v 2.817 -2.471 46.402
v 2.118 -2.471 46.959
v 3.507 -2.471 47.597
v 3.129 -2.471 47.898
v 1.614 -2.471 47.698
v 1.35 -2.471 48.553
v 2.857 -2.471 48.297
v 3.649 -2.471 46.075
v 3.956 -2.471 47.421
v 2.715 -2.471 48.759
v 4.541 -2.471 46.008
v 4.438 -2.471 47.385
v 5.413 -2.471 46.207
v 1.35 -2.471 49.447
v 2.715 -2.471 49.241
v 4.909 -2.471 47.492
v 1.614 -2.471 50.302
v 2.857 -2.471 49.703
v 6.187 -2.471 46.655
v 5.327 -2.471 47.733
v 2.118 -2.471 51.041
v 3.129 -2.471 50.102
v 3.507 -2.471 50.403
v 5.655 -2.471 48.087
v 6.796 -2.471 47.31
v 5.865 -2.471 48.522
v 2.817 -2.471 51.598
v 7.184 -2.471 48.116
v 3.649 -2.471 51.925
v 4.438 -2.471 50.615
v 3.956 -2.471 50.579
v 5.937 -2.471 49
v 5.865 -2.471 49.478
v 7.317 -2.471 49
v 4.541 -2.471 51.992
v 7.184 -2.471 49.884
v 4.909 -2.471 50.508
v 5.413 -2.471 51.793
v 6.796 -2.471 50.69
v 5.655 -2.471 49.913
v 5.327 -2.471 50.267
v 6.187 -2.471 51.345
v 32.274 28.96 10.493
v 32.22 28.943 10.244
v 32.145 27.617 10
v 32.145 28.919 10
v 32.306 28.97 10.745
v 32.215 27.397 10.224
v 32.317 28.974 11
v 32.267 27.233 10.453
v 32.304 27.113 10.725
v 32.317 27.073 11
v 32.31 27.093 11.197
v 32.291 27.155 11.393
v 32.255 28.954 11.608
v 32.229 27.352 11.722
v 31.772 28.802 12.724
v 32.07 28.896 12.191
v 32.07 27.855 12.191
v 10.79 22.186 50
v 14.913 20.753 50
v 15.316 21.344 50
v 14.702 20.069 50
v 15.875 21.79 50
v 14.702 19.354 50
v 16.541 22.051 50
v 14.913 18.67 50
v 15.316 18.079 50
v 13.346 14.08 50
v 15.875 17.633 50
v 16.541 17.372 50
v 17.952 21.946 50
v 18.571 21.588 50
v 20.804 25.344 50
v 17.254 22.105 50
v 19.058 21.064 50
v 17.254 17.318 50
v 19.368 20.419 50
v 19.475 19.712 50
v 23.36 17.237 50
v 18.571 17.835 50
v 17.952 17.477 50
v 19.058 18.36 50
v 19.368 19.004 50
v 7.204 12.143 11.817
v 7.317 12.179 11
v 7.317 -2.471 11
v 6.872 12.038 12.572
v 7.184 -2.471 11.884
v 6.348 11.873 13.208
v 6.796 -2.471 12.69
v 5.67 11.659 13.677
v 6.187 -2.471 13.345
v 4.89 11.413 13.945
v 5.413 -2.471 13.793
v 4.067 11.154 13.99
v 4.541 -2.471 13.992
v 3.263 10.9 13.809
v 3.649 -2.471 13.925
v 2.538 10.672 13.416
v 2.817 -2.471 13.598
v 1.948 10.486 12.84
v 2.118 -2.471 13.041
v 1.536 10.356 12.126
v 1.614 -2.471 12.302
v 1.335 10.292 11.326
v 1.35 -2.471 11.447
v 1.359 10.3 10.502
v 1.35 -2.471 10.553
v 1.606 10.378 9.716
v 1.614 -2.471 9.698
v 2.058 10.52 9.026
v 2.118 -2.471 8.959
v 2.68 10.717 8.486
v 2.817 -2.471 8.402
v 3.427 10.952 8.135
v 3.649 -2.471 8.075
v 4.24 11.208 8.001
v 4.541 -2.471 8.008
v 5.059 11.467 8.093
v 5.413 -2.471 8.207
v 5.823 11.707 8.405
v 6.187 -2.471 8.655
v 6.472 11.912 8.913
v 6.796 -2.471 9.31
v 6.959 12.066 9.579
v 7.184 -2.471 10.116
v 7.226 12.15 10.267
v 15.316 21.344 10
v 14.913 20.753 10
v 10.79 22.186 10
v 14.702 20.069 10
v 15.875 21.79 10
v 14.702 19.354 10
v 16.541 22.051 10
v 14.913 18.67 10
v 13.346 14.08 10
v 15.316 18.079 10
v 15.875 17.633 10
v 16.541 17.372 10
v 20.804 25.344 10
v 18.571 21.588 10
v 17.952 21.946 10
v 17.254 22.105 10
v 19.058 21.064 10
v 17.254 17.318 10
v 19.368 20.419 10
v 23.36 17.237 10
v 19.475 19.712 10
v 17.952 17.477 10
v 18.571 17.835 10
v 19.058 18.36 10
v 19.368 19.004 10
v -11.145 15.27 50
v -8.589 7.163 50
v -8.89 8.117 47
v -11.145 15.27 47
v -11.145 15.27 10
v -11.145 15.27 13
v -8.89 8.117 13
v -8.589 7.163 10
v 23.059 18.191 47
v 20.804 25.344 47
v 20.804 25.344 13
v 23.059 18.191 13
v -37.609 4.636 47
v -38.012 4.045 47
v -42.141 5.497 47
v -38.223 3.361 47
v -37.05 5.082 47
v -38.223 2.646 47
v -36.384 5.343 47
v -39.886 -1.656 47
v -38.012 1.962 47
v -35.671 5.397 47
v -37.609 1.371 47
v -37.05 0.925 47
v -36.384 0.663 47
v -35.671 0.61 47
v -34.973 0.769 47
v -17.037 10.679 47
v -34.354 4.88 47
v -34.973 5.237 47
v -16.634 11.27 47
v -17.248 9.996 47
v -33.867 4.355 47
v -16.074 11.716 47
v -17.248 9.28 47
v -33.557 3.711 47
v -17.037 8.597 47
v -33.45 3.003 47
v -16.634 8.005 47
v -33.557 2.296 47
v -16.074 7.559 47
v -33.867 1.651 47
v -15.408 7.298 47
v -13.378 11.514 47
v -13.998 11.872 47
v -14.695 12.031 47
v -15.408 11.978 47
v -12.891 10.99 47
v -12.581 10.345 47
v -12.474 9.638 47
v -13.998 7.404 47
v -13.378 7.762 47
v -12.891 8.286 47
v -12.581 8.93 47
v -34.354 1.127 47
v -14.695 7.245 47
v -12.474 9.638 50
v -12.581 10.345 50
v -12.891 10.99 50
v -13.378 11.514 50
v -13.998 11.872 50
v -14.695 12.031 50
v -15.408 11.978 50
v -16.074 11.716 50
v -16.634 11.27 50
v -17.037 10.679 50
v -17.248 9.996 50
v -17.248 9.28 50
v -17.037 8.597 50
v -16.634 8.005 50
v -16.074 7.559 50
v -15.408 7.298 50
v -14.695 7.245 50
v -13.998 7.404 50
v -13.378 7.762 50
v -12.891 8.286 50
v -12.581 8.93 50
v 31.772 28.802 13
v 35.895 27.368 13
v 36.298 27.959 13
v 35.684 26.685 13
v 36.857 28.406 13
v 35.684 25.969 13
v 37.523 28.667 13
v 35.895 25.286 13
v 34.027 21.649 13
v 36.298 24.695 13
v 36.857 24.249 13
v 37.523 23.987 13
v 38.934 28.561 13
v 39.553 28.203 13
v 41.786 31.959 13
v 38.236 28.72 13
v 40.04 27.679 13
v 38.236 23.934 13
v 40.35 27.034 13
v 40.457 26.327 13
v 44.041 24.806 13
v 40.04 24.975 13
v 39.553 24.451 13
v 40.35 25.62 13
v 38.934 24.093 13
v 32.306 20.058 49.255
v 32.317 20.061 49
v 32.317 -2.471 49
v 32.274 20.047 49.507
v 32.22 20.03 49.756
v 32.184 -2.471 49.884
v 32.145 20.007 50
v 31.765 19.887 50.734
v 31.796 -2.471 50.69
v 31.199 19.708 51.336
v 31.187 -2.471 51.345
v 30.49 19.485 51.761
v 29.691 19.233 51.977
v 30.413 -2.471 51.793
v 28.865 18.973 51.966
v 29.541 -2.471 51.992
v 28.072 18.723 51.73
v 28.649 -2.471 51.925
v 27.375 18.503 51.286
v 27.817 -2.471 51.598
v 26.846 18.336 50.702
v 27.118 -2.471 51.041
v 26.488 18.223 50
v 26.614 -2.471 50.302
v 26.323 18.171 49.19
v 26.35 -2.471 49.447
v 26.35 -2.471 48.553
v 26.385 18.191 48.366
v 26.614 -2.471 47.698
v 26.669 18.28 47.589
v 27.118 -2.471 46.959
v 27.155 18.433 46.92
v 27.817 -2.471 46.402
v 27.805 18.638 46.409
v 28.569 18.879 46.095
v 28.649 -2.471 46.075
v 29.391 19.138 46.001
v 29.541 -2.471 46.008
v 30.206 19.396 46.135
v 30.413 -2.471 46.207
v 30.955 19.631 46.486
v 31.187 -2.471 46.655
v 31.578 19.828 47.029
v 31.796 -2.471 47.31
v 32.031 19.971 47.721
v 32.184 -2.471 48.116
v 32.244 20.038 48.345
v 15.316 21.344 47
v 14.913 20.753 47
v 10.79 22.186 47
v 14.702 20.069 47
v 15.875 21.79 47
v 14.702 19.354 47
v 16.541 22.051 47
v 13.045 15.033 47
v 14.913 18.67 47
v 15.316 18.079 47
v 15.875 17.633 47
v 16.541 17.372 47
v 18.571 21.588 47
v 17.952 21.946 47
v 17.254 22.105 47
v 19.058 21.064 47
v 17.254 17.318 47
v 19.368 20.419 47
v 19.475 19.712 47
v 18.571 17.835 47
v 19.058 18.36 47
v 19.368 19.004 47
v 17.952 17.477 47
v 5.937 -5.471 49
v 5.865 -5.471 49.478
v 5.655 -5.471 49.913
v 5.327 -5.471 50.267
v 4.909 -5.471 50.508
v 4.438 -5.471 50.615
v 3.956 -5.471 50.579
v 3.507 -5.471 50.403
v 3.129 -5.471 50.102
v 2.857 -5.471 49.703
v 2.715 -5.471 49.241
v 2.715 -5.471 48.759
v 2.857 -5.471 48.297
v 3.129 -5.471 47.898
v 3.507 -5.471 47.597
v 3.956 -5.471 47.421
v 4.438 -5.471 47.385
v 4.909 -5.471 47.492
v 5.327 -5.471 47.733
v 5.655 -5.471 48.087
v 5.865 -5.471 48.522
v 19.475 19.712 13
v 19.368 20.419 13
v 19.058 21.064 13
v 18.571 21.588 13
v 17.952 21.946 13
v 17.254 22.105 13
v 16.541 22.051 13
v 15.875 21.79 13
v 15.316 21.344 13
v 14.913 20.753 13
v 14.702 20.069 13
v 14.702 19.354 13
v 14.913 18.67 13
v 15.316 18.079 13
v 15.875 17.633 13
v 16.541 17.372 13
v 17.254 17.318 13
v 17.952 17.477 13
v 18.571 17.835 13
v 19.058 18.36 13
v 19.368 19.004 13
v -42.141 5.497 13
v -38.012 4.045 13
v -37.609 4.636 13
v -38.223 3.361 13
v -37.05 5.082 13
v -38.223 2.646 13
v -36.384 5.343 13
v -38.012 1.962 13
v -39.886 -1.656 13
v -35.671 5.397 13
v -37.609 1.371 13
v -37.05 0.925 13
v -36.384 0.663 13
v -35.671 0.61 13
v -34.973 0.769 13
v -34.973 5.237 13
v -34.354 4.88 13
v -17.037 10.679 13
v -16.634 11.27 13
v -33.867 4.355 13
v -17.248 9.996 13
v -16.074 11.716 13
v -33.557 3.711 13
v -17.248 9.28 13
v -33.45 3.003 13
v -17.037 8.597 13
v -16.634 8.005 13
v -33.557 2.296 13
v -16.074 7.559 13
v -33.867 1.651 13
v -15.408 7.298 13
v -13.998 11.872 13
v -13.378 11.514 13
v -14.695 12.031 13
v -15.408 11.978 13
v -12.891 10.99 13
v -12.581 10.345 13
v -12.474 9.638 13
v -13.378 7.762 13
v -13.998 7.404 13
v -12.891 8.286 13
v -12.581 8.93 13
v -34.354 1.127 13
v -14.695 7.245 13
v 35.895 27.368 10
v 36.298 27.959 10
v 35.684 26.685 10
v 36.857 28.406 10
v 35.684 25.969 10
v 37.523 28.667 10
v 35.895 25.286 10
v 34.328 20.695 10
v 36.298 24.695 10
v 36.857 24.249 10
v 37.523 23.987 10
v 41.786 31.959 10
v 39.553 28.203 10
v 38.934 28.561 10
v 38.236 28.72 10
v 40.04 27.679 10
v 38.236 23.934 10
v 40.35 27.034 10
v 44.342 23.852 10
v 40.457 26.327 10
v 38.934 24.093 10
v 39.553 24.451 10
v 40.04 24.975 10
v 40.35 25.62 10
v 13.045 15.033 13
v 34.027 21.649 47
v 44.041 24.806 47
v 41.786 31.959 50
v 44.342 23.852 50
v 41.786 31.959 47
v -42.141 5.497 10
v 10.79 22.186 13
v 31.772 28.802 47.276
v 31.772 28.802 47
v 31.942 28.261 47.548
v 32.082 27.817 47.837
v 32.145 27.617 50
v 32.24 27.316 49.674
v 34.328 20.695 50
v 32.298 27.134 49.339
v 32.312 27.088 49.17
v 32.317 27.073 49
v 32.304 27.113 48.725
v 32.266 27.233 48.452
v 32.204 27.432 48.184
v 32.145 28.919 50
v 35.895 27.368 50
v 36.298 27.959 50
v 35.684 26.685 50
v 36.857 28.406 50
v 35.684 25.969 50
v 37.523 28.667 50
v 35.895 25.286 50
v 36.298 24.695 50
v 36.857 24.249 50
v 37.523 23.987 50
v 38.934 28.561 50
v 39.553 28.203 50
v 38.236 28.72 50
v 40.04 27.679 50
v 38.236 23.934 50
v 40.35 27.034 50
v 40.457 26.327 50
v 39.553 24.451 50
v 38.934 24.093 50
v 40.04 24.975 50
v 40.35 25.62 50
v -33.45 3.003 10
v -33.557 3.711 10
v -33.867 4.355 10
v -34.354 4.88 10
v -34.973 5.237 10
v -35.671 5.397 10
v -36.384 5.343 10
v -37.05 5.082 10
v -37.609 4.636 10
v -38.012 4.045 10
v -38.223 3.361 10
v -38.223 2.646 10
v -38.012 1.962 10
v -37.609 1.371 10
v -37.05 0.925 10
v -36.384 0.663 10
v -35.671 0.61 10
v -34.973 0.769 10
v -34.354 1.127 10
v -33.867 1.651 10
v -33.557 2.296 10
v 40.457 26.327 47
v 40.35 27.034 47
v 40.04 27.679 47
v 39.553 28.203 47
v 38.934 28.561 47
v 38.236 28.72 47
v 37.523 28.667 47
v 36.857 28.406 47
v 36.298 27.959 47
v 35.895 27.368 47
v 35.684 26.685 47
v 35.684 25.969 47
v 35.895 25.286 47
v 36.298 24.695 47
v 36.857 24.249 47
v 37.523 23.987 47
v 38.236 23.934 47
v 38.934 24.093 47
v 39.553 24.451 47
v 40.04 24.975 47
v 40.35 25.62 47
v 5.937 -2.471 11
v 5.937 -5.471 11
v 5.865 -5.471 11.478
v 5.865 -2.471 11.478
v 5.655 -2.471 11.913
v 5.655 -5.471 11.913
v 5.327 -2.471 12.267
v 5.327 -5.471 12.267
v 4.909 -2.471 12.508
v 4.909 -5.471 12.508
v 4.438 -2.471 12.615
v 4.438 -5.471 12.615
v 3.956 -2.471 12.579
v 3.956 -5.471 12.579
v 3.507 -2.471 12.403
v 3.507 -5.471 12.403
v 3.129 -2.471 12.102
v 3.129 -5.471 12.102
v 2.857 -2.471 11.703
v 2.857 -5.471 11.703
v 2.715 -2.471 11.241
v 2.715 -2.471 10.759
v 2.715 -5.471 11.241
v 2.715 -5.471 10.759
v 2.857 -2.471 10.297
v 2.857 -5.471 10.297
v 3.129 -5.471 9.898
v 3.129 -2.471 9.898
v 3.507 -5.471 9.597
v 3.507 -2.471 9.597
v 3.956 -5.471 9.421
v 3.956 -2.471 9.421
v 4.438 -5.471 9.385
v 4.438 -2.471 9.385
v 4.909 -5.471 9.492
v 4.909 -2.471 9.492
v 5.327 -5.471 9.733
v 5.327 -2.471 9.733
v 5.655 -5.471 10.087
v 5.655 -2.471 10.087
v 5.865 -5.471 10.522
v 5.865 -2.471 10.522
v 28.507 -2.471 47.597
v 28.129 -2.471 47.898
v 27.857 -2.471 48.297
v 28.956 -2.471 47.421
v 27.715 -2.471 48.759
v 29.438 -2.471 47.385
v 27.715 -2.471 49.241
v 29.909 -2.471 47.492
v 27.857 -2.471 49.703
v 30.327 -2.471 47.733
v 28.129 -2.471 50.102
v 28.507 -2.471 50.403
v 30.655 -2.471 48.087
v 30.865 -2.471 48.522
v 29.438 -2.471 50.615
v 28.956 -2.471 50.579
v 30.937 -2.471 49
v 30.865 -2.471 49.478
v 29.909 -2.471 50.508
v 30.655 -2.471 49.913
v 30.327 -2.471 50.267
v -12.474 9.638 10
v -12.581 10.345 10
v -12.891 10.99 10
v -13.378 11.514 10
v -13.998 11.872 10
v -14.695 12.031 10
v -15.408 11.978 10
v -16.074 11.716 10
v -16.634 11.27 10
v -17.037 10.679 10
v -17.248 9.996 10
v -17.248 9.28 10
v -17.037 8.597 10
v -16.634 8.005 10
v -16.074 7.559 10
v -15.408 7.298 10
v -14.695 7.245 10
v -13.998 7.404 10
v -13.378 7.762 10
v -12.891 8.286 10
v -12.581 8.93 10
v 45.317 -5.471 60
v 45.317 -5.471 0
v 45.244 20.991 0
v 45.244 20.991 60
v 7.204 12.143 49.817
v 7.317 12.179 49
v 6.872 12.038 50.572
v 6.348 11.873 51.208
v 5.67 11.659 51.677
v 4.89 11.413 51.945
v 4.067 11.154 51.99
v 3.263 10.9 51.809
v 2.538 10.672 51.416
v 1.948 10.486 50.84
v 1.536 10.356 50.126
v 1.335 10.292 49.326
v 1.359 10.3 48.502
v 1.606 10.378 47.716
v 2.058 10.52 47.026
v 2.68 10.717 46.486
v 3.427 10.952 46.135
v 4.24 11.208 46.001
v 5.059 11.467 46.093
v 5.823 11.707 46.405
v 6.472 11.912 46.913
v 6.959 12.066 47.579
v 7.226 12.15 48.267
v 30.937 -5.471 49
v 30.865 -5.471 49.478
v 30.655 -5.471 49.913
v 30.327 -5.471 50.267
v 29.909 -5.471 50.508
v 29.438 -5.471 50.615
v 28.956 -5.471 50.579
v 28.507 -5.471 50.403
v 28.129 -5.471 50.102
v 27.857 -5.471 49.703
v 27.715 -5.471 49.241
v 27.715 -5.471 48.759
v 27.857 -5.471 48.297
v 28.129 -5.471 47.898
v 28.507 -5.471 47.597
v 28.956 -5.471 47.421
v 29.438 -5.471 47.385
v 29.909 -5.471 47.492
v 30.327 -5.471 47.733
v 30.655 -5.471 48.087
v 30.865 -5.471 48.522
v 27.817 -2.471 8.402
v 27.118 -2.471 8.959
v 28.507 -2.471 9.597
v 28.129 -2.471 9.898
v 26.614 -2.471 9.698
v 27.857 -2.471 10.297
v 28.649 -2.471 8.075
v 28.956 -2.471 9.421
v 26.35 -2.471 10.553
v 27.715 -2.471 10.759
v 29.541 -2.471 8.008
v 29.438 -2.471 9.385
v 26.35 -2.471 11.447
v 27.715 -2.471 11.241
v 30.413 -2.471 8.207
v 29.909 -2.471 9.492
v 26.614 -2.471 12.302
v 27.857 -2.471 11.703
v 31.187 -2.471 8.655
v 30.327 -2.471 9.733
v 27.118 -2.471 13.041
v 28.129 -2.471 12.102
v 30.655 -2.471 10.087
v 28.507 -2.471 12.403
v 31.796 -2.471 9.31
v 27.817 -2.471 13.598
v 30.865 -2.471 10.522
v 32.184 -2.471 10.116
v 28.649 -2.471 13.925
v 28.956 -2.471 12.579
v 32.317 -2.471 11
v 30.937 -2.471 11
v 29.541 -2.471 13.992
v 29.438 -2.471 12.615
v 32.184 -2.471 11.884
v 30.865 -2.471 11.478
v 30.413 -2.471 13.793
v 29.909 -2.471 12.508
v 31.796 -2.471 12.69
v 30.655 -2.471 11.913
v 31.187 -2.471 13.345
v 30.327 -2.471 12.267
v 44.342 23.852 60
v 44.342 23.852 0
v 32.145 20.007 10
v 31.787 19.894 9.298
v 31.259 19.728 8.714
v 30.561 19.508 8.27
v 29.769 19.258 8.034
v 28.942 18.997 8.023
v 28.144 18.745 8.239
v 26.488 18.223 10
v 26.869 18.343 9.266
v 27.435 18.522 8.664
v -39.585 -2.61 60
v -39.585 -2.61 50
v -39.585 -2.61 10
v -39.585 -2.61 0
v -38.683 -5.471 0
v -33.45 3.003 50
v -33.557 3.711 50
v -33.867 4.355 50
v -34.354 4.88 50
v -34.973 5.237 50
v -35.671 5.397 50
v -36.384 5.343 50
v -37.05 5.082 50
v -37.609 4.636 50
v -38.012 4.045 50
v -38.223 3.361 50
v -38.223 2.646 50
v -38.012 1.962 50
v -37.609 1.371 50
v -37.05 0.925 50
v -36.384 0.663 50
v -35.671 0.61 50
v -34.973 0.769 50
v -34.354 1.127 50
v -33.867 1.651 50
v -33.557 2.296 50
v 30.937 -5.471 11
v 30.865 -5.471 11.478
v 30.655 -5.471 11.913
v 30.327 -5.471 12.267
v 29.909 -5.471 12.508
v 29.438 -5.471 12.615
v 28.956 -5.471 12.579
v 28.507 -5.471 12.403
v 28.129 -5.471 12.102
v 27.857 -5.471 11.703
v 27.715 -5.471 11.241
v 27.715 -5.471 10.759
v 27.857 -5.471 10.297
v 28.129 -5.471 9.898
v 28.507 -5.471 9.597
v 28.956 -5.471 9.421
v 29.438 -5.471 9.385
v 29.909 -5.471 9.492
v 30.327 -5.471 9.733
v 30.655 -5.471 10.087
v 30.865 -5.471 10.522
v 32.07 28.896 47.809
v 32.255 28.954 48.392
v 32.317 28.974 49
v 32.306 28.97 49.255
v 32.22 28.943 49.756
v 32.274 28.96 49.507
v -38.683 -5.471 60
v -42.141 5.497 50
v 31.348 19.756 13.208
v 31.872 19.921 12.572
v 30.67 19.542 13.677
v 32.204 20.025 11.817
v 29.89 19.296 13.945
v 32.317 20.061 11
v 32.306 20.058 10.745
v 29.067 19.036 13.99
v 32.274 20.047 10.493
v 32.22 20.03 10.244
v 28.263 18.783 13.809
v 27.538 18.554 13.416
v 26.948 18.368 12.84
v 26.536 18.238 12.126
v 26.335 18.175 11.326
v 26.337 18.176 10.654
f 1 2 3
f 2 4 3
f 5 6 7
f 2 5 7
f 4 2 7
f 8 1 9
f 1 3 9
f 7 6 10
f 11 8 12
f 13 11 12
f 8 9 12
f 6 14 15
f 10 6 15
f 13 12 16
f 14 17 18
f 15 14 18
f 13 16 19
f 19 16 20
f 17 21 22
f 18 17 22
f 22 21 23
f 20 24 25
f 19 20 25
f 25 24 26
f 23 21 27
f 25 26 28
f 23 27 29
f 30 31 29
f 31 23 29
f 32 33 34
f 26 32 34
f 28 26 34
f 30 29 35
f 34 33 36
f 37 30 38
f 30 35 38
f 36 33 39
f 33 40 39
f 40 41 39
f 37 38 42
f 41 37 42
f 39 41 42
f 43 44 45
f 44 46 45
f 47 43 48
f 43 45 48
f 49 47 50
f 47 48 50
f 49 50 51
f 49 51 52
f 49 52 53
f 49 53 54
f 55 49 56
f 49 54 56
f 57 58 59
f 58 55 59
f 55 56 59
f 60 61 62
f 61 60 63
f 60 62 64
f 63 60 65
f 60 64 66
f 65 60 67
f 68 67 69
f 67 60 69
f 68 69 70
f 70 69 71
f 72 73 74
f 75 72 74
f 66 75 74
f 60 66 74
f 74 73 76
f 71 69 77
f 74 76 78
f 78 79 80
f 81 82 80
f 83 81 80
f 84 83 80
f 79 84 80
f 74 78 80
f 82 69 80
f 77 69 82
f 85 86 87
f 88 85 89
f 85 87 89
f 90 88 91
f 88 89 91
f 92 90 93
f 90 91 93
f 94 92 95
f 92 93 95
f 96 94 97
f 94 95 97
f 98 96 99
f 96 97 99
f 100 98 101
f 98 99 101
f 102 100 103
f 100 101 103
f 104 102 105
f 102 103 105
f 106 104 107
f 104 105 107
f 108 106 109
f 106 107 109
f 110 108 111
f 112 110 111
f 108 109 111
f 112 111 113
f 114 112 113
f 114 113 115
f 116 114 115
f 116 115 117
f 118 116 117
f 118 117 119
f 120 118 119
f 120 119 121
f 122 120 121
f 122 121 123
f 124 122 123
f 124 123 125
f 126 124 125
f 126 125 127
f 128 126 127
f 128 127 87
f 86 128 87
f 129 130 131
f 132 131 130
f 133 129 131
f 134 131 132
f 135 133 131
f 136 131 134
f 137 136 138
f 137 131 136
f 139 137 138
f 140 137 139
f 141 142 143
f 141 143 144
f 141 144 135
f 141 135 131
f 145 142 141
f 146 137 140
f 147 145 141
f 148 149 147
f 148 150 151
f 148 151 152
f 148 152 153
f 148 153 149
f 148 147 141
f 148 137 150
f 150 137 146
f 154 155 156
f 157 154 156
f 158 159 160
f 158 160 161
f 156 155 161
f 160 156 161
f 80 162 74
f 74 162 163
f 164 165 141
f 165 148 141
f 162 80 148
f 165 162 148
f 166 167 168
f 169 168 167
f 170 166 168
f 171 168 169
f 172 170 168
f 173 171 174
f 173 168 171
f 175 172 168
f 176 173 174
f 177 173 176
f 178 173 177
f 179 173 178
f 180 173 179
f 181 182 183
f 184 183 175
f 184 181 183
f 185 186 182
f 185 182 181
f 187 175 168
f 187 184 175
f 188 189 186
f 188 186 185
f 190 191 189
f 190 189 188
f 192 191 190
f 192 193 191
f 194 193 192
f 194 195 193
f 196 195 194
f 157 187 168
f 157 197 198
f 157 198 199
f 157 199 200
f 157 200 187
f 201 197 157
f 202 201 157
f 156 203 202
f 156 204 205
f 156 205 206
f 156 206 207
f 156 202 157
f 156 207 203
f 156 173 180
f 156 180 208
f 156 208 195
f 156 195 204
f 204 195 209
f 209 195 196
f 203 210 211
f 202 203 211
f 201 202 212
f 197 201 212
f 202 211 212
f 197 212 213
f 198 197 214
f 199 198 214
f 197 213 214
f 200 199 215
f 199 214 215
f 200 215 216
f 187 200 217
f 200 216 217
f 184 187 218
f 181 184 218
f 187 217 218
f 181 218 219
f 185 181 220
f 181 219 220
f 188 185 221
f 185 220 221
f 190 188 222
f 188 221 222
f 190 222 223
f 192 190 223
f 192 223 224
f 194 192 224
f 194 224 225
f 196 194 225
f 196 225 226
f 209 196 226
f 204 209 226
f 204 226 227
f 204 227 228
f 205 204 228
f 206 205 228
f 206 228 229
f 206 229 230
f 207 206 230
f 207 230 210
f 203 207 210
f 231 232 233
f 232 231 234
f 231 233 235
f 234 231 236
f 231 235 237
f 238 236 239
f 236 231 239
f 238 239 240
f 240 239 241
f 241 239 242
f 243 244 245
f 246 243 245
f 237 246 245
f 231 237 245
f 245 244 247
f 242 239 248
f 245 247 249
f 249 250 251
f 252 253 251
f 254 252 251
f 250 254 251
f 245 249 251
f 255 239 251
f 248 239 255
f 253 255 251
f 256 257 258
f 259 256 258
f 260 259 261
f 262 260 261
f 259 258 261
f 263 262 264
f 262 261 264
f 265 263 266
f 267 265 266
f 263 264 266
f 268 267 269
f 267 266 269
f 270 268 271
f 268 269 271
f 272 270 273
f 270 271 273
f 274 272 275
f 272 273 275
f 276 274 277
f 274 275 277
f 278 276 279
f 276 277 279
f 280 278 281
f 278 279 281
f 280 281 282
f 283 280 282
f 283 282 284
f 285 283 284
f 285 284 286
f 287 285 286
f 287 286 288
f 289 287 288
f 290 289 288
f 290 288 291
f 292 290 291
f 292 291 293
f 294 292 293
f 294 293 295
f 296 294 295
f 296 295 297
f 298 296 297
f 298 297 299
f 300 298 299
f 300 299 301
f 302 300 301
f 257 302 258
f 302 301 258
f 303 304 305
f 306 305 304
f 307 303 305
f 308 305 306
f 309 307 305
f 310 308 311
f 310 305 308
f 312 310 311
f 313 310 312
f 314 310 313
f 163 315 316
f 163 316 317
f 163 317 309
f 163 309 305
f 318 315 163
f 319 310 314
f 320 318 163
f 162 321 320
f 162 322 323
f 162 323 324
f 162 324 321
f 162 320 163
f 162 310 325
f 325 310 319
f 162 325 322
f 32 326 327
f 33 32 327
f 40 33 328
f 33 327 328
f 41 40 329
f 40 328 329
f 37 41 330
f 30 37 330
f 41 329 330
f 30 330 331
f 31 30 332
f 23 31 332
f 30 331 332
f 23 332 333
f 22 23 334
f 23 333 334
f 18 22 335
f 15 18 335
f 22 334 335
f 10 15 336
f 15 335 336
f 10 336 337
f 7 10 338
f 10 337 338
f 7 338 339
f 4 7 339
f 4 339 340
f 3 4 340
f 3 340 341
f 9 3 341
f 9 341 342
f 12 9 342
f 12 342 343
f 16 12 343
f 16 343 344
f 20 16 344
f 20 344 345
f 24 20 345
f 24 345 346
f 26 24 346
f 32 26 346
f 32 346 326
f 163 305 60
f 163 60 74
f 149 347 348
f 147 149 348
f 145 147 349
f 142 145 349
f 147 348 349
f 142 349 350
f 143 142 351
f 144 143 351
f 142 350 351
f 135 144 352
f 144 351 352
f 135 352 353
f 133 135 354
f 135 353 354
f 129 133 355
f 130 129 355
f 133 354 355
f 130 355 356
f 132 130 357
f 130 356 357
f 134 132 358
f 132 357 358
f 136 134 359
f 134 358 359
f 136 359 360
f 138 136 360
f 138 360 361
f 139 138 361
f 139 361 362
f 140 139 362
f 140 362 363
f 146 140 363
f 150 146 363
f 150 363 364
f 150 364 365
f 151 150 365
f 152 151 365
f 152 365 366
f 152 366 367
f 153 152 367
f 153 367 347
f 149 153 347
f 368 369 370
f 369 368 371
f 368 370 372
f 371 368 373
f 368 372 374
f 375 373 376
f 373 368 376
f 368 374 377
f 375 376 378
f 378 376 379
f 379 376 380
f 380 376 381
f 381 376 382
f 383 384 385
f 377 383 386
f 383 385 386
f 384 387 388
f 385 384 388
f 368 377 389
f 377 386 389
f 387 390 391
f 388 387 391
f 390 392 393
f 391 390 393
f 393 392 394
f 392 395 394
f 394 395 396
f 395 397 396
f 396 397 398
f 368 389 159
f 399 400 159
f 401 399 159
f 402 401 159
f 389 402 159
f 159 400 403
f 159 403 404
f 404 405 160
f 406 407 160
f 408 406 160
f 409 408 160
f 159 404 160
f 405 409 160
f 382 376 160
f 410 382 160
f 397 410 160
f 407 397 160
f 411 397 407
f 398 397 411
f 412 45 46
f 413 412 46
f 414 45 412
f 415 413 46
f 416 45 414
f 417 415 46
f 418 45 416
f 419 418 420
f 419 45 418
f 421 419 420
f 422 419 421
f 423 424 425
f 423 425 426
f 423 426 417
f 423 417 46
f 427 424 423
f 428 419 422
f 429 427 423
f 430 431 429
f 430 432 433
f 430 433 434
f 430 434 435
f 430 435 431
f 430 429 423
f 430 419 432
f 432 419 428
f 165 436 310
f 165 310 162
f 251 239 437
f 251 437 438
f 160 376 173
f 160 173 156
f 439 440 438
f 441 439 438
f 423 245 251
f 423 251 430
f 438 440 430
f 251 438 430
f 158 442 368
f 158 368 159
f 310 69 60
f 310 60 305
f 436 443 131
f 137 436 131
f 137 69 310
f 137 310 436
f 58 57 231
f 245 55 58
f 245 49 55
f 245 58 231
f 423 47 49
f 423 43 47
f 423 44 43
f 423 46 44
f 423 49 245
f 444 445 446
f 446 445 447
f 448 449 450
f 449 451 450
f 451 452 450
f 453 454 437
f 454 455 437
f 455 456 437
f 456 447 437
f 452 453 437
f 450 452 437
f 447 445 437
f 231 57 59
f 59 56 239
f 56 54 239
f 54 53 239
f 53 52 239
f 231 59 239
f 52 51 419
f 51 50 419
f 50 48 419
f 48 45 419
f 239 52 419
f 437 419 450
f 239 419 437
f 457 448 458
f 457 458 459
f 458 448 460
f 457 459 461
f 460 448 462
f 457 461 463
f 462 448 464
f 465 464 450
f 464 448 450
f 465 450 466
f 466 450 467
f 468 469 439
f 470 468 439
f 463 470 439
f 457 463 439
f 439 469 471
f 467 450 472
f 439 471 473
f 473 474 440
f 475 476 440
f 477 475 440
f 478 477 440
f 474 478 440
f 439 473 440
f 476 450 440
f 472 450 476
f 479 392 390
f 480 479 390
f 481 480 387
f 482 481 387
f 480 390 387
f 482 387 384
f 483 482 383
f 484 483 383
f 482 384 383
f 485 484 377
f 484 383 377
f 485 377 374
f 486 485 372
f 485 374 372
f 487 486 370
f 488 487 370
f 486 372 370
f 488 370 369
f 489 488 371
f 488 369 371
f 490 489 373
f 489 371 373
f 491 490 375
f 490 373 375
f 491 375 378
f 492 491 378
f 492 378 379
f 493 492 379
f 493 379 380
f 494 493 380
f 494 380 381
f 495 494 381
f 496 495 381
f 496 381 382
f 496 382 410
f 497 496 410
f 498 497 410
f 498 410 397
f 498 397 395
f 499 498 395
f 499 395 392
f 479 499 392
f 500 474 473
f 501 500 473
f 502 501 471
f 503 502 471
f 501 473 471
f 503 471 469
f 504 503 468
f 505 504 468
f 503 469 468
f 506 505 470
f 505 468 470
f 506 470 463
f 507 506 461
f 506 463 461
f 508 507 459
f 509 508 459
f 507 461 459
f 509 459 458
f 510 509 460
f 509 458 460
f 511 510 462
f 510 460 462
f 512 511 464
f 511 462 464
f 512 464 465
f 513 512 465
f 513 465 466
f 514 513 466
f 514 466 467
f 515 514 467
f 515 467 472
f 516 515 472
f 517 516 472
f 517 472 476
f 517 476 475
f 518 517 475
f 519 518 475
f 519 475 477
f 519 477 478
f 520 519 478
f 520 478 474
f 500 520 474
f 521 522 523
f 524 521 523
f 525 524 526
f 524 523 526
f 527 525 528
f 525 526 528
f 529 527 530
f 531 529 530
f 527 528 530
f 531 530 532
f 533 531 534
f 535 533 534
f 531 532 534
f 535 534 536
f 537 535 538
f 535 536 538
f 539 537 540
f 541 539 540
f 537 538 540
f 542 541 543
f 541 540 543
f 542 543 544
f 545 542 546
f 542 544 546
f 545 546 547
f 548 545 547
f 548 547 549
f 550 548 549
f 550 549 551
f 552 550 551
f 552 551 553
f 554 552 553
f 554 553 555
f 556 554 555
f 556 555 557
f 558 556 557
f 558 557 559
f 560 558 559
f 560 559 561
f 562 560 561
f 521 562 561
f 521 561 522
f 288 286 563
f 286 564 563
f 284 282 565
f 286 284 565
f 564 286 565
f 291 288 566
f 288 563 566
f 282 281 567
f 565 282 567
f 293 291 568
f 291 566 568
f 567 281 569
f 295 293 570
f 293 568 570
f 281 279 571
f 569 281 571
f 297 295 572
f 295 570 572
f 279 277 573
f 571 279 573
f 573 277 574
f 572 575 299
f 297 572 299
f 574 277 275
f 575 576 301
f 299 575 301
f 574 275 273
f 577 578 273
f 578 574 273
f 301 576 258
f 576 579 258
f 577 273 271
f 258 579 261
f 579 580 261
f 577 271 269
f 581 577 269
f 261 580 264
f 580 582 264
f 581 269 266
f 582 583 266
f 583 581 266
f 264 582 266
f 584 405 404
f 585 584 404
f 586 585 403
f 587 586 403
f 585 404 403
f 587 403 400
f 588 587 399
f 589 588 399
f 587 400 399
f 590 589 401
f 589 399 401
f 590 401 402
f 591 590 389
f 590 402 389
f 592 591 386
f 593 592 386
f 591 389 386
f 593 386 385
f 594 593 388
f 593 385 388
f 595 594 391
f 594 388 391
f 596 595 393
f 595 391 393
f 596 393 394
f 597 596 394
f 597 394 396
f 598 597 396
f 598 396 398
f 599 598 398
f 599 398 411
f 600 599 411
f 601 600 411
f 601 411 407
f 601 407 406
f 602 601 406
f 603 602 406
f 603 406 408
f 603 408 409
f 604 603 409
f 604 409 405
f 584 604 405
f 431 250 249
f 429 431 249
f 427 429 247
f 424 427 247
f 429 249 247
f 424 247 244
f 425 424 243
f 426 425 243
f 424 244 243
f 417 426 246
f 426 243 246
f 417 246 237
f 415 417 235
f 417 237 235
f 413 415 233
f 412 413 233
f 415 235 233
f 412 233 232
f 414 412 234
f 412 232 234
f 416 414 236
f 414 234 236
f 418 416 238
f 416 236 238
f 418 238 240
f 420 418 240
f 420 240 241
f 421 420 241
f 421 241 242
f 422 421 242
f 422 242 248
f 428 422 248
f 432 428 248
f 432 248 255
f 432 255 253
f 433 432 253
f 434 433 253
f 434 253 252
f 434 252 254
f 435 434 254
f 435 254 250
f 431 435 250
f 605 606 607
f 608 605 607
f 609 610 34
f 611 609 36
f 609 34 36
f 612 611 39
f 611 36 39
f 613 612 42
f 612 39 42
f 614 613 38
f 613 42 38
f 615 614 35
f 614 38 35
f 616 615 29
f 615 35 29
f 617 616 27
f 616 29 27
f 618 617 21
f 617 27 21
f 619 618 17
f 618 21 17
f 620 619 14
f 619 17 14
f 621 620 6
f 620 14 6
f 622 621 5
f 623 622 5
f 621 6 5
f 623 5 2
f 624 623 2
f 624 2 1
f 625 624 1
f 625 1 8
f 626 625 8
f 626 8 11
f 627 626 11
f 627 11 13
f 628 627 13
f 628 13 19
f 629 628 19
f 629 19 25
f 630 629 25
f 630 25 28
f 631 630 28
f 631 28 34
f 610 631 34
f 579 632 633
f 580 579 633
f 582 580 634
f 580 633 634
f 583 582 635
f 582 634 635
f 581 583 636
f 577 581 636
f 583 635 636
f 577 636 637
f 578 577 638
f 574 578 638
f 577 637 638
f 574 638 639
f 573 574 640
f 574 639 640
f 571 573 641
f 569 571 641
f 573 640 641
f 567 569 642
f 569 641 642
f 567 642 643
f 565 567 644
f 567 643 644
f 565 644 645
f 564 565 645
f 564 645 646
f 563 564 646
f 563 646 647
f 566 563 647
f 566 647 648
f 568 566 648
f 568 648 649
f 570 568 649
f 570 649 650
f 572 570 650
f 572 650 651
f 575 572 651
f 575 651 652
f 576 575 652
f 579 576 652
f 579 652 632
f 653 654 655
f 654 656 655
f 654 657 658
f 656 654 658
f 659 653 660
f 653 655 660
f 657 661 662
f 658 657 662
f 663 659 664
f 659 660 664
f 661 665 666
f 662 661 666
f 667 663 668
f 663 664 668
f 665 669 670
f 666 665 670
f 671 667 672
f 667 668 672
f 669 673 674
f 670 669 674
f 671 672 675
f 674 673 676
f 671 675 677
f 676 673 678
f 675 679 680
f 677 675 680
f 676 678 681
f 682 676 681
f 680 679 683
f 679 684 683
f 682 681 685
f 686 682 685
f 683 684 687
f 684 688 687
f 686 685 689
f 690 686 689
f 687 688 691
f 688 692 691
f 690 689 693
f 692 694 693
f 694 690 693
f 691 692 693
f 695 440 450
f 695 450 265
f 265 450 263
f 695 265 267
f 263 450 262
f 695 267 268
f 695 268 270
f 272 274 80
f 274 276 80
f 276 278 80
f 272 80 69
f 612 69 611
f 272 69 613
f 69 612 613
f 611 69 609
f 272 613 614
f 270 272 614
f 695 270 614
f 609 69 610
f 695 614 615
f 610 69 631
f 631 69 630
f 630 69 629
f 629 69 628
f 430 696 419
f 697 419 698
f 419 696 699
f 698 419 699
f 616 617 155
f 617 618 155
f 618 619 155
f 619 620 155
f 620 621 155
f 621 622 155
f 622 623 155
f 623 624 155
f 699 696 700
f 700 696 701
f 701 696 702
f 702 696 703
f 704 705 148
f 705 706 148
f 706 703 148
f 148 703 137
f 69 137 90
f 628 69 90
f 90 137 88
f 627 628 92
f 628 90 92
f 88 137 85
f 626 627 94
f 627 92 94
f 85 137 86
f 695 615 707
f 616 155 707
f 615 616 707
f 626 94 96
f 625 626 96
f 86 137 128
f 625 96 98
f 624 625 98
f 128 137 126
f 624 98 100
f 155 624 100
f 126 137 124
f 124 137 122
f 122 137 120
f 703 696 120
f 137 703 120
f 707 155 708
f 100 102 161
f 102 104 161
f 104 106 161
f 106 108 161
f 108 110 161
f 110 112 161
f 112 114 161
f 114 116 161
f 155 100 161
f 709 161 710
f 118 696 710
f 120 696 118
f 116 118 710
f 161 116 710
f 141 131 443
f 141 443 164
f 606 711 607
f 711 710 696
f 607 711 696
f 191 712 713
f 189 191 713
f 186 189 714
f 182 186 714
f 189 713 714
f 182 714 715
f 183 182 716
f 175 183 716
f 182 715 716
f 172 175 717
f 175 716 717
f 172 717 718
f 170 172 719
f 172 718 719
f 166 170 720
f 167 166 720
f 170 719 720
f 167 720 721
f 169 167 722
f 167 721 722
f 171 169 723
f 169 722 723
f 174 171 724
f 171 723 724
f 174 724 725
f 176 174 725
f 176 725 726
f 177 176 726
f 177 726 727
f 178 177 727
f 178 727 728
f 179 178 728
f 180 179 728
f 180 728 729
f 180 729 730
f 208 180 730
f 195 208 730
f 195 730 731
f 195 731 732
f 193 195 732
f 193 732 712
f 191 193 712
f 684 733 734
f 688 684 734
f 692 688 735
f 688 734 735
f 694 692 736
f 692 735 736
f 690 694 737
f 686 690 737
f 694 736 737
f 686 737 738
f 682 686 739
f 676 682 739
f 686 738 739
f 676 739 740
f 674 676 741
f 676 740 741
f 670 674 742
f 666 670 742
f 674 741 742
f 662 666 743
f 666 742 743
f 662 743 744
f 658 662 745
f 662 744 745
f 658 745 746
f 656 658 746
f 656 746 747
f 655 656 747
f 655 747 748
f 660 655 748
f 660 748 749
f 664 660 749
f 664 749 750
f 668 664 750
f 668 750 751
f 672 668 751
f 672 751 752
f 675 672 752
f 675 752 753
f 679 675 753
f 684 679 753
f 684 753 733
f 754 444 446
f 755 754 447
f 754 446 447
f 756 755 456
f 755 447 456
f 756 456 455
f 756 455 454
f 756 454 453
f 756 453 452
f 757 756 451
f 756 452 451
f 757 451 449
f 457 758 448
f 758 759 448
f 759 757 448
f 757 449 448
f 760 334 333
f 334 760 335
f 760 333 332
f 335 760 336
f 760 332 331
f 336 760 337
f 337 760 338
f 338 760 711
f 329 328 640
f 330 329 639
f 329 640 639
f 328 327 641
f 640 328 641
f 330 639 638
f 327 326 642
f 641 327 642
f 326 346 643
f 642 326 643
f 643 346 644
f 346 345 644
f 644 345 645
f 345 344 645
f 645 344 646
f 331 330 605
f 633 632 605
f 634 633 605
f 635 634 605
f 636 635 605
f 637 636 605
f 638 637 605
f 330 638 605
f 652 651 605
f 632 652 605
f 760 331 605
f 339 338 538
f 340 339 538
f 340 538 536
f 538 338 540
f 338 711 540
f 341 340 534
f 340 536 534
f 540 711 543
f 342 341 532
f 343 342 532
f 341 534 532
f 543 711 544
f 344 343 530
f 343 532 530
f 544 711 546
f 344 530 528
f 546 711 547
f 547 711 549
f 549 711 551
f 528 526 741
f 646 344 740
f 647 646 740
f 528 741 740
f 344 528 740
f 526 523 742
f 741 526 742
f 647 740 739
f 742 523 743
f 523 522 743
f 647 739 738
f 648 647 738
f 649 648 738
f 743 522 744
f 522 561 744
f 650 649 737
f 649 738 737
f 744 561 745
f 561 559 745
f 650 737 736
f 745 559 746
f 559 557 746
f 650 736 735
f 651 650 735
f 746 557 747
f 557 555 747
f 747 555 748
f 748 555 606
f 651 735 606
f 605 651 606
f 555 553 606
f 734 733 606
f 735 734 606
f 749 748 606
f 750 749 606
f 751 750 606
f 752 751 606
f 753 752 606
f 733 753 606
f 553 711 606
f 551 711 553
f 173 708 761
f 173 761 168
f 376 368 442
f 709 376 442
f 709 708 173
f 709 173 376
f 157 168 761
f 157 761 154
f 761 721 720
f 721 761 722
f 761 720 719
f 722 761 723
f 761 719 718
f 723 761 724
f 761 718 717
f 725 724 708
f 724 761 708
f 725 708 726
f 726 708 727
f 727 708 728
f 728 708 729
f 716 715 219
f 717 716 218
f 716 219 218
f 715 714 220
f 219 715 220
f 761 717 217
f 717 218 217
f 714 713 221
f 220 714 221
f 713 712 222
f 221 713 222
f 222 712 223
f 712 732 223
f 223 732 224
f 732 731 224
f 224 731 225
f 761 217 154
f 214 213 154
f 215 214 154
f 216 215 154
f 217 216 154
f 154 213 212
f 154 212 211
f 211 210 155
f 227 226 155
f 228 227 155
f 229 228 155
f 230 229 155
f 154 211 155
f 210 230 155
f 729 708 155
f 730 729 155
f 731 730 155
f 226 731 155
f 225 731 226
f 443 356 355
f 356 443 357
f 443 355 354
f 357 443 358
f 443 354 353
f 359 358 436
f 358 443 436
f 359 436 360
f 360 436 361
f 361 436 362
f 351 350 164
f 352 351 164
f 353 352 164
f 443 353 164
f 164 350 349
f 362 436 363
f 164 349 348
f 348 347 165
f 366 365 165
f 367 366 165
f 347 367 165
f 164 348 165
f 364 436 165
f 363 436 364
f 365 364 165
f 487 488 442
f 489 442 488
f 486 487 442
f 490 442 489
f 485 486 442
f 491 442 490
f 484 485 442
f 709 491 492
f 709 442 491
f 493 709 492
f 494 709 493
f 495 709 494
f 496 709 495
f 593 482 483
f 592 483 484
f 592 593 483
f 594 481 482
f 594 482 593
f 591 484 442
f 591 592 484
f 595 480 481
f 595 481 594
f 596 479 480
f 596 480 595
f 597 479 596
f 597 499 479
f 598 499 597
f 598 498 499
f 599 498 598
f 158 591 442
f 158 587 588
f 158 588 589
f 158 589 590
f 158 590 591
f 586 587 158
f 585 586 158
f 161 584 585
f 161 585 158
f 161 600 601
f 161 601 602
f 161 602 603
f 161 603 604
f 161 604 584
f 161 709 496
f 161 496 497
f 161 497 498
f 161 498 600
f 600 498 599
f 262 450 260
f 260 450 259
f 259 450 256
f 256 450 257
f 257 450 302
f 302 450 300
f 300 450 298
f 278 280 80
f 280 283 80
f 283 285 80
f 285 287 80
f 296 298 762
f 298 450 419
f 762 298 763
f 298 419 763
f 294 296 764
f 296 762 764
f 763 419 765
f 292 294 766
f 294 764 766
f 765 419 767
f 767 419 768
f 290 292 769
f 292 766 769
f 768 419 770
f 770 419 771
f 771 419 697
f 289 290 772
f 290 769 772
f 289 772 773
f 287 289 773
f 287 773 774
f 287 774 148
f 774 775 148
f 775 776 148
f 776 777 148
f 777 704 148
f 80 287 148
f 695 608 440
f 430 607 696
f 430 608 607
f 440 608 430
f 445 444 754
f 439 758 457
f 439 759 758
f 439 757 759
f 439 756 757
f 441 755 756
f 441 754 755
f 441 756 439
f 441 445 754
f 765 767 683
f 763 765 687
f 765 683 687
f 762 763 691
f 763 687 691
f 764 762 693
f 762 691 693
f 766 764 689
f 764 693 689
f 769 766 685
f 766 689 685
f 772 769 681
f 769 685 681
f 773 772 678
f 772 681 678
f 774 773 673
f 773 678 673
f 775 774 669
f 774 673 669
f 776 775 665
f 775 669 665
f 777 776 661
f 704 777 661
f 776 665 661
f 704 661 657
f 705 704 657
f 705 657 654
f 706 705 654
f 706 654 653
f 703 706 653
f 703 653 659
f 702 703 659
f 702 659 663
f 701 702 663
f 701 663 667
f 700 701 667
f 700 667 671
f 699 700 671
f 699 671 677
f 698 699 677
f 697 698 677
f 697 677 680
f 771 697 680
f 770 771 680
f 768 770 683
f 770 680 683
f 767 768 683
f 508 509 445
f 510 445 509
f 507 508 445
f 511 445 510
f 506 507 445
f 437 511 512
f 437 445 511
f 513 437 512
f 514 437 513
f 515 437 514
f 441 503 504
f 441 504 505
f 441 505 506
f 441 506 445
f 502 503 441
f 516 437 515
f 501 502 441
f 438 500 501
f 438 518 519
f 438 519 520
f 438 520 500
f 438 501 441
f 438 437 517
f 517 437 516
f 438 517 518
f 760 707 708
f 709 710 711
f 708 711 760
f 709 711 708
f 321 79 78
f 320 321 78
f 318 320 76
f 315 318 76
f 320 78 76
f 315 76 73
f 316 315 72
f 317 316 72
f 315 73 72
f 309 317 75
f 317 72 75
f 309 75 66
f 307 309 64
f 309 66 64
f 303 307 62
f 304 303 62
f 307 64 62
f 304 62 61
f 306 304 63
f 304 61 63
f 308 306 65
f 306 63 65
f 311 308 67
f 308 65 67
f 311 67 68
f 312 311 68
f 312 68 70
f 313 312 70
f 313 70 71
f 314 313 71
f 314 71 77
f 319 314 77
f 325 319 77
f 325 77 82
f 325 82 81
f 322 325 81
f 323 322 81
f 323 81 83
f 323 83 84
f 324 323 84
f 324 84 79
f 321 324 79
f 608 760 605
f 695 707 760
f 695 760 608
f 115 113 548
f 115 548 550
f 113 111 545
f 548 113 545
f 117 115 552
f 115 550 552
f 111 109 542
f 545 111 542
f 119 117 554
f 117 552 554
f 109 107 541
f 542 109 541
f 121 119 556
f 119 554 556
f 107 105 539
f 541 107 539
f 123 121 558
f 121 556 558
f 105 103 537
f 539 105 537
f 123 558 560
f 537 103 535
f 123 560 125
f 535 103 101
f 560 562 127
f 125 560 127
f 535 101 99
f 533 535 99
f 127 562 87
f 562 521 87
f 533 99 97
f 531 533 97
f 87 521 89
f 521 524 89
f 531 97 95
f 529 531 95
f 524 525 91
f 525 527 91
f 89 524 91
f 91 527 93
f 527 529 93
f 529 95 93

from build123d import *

# Parameters (mm, degrees)
EXTRUDE_1_DEPTH     = 60
SKETCH_2_W          = 32.5
SKETCH_2_H          = 3
EXTRUDE_2_DEPTH     = 8.5
SKETCH_3_W          = 32.5
SKETCH_3_H          = 34
EXTRUDE_3_DEPTH     = 1
SKETCH_4_R          = 2.4
CUT_EXTRUDE_1_DEPTH = 100
CUT_EXTRUDE_3_DEPTH = 100
SKETCH_5_R          = 1.62
CUT_EXTRUDE_4_DEPTH = 100
SKETCH_7_R          = 3
CUT_EXTRUDE_5_DEPTH = 100


with BuildPart() as part:
    # 草图1 → 凸台-拉伸1 (new body)
    with BuildSketch(Plane.XY):
        Polygon((-38.683076923, -5.470769231), (45.316923077, -5.470769231), (45.244014743, 20.991341126), (44.341897344, 23.852491978), (-39.585194322, -2.609618379), align=None)
    extrude(amount=EXTRUDE_1_DEPTH)

    # 草图2 → 凸台-拉伸2 (add)
    with BuildSketch(Plane(origin=(-2.83104293, 8.978921042, 0), x_dir=(0.9537169507482267, 0.30070579950427384, 0), z_dir=(-0.30070579950427384, 0.9537169507482267, 0))):
        with Locations((-22.287798204, -11.5)):
            Rectangle(SKETCH_2_W, SKETCH_2_H)
        with Locations((-22.287798204, -48.5)):
            Rectangle(SKETCH_2_W, SKETCH_2_H)
        with Locations((33.212201796, -11.5)):
            Rectangle(SKETCH_2_W, SKETCH_2_H)
        with Locations((33.212201796, -48.5)):
            Rectangle(SKETCH_2_W, SKETCH_2_H)
    extrude(amount=EXTRUDE_2_DEPTH)

    # 草图3 → 凸台-拉伸3 (add)
    with BuildSketch(Plane(origin=(-2.83104293, 8.978921042, 0), x_dir=(0.9537169507482267, 0.30070579950427384, 0), z_dir=(-0.30070579950427384, 0.9537169507482267, 0))):
        with Locations((-22.287798204, -30)):
            Rectangle(SKETCH_3_W, SKETCH_3_H)
        with Locations((33.212201796, -30)):
            Rectangle(SKETCH_3_W, SKETCH_3_H)
    extrude(amount=EXTRUDE_3_DEPTH)

    # 草图4 → 切除-拉伸1 (cut)
    with BuildSketch(Plane.XY.offset(50)):
        with Locations((-35.850165862, 3.003309771)):
            Circle(SKETCH_4_R)
        with Locations((-14.874407062, 9.637911699)):
            Circle(SKETCH_4_R)
        with Locations((17.075110788, 19.711555982)):
            Circle(SKETCH_4_R)
        with Locations((38.056883705, 26.327083571)):
            Circle(SKETCH_4_R)
    extrude(amount=-CUT_EXTRUDE_1_DEPTH, mode=Mode.SUBTRACT)

    # 草图6 → 切除-拉伸3 (cut)
    with BuildSketch(Plane(origin=(0, 0, 10), x_dir=(-1, 0, 0), z_dir=(0, 0, -1))):
        Polygon((-31.771870066, 28.801675164), (-34.327869361, 20.695081083), (-23.360124428, 17.236964389), (-20.804125132, 25.34355847), align=None)
    extrude(amount=-CUT_EXTRUDE_3_DEPTH, mode=Mode.SUBTRACT)

    # 草图5 → 切除-拉伸4 (cut)
    with BuildSketch(Plane(origin=(0, -5.470769231, 0), x_dir=(-1, 0, 0), z_dir=(0, -1, 0))):
        with Locations(Location((-29.316923077, -49, 0), (0, 0, 180))):
            Circle(SKETCH_5_R)
        with Locations(Location((-29.316923077, -11, 0), (0, 0, 180))):
            Circle(SKETCH_5_R)
        with Locations(Location((-4.316923077, -49, 0), (0, 0, 180))):
            Circle(SKETCH_5_R)
        with Locations(Location((-4.316923077, -11, 0), (0, 0, 180))):
            Circle(SKETCH_5_R)
    extrude(amount=-CUT_EXTRUDE_4_DEPTH, mode=Mode.SUBTRACT)

    # 草图7 → 切除-拉伸5 (cut)
    with BuildSketch(Plane(origin=(0, -2.470769231, 0), x_dir=(-1, 0, 0), z_dir=(0, -1, 0))):
        with Locations(Location((-29.316923077, -11, 0), (0, 0, 180))):
            Circle(SKETCH_7_R)
        with Locations(Location((-4.316923077, -11, 0), (0, 0, 180))):
            Circle(SKETCH_7_R)
        with Locations(Location((-29.316923077, -49, 0), (0, 0, 180))):
            Circle(SKETCH_7_R)
        with Locations(Location((-4.316923077, -49, 0), (0, 0, 180))):
            Circle(SKETCH_7_R)
    extrude(amount=-CUT_EXTRUDE_5_DEPTH, mode=Mode.SUBTRACT)


solid = part.part
